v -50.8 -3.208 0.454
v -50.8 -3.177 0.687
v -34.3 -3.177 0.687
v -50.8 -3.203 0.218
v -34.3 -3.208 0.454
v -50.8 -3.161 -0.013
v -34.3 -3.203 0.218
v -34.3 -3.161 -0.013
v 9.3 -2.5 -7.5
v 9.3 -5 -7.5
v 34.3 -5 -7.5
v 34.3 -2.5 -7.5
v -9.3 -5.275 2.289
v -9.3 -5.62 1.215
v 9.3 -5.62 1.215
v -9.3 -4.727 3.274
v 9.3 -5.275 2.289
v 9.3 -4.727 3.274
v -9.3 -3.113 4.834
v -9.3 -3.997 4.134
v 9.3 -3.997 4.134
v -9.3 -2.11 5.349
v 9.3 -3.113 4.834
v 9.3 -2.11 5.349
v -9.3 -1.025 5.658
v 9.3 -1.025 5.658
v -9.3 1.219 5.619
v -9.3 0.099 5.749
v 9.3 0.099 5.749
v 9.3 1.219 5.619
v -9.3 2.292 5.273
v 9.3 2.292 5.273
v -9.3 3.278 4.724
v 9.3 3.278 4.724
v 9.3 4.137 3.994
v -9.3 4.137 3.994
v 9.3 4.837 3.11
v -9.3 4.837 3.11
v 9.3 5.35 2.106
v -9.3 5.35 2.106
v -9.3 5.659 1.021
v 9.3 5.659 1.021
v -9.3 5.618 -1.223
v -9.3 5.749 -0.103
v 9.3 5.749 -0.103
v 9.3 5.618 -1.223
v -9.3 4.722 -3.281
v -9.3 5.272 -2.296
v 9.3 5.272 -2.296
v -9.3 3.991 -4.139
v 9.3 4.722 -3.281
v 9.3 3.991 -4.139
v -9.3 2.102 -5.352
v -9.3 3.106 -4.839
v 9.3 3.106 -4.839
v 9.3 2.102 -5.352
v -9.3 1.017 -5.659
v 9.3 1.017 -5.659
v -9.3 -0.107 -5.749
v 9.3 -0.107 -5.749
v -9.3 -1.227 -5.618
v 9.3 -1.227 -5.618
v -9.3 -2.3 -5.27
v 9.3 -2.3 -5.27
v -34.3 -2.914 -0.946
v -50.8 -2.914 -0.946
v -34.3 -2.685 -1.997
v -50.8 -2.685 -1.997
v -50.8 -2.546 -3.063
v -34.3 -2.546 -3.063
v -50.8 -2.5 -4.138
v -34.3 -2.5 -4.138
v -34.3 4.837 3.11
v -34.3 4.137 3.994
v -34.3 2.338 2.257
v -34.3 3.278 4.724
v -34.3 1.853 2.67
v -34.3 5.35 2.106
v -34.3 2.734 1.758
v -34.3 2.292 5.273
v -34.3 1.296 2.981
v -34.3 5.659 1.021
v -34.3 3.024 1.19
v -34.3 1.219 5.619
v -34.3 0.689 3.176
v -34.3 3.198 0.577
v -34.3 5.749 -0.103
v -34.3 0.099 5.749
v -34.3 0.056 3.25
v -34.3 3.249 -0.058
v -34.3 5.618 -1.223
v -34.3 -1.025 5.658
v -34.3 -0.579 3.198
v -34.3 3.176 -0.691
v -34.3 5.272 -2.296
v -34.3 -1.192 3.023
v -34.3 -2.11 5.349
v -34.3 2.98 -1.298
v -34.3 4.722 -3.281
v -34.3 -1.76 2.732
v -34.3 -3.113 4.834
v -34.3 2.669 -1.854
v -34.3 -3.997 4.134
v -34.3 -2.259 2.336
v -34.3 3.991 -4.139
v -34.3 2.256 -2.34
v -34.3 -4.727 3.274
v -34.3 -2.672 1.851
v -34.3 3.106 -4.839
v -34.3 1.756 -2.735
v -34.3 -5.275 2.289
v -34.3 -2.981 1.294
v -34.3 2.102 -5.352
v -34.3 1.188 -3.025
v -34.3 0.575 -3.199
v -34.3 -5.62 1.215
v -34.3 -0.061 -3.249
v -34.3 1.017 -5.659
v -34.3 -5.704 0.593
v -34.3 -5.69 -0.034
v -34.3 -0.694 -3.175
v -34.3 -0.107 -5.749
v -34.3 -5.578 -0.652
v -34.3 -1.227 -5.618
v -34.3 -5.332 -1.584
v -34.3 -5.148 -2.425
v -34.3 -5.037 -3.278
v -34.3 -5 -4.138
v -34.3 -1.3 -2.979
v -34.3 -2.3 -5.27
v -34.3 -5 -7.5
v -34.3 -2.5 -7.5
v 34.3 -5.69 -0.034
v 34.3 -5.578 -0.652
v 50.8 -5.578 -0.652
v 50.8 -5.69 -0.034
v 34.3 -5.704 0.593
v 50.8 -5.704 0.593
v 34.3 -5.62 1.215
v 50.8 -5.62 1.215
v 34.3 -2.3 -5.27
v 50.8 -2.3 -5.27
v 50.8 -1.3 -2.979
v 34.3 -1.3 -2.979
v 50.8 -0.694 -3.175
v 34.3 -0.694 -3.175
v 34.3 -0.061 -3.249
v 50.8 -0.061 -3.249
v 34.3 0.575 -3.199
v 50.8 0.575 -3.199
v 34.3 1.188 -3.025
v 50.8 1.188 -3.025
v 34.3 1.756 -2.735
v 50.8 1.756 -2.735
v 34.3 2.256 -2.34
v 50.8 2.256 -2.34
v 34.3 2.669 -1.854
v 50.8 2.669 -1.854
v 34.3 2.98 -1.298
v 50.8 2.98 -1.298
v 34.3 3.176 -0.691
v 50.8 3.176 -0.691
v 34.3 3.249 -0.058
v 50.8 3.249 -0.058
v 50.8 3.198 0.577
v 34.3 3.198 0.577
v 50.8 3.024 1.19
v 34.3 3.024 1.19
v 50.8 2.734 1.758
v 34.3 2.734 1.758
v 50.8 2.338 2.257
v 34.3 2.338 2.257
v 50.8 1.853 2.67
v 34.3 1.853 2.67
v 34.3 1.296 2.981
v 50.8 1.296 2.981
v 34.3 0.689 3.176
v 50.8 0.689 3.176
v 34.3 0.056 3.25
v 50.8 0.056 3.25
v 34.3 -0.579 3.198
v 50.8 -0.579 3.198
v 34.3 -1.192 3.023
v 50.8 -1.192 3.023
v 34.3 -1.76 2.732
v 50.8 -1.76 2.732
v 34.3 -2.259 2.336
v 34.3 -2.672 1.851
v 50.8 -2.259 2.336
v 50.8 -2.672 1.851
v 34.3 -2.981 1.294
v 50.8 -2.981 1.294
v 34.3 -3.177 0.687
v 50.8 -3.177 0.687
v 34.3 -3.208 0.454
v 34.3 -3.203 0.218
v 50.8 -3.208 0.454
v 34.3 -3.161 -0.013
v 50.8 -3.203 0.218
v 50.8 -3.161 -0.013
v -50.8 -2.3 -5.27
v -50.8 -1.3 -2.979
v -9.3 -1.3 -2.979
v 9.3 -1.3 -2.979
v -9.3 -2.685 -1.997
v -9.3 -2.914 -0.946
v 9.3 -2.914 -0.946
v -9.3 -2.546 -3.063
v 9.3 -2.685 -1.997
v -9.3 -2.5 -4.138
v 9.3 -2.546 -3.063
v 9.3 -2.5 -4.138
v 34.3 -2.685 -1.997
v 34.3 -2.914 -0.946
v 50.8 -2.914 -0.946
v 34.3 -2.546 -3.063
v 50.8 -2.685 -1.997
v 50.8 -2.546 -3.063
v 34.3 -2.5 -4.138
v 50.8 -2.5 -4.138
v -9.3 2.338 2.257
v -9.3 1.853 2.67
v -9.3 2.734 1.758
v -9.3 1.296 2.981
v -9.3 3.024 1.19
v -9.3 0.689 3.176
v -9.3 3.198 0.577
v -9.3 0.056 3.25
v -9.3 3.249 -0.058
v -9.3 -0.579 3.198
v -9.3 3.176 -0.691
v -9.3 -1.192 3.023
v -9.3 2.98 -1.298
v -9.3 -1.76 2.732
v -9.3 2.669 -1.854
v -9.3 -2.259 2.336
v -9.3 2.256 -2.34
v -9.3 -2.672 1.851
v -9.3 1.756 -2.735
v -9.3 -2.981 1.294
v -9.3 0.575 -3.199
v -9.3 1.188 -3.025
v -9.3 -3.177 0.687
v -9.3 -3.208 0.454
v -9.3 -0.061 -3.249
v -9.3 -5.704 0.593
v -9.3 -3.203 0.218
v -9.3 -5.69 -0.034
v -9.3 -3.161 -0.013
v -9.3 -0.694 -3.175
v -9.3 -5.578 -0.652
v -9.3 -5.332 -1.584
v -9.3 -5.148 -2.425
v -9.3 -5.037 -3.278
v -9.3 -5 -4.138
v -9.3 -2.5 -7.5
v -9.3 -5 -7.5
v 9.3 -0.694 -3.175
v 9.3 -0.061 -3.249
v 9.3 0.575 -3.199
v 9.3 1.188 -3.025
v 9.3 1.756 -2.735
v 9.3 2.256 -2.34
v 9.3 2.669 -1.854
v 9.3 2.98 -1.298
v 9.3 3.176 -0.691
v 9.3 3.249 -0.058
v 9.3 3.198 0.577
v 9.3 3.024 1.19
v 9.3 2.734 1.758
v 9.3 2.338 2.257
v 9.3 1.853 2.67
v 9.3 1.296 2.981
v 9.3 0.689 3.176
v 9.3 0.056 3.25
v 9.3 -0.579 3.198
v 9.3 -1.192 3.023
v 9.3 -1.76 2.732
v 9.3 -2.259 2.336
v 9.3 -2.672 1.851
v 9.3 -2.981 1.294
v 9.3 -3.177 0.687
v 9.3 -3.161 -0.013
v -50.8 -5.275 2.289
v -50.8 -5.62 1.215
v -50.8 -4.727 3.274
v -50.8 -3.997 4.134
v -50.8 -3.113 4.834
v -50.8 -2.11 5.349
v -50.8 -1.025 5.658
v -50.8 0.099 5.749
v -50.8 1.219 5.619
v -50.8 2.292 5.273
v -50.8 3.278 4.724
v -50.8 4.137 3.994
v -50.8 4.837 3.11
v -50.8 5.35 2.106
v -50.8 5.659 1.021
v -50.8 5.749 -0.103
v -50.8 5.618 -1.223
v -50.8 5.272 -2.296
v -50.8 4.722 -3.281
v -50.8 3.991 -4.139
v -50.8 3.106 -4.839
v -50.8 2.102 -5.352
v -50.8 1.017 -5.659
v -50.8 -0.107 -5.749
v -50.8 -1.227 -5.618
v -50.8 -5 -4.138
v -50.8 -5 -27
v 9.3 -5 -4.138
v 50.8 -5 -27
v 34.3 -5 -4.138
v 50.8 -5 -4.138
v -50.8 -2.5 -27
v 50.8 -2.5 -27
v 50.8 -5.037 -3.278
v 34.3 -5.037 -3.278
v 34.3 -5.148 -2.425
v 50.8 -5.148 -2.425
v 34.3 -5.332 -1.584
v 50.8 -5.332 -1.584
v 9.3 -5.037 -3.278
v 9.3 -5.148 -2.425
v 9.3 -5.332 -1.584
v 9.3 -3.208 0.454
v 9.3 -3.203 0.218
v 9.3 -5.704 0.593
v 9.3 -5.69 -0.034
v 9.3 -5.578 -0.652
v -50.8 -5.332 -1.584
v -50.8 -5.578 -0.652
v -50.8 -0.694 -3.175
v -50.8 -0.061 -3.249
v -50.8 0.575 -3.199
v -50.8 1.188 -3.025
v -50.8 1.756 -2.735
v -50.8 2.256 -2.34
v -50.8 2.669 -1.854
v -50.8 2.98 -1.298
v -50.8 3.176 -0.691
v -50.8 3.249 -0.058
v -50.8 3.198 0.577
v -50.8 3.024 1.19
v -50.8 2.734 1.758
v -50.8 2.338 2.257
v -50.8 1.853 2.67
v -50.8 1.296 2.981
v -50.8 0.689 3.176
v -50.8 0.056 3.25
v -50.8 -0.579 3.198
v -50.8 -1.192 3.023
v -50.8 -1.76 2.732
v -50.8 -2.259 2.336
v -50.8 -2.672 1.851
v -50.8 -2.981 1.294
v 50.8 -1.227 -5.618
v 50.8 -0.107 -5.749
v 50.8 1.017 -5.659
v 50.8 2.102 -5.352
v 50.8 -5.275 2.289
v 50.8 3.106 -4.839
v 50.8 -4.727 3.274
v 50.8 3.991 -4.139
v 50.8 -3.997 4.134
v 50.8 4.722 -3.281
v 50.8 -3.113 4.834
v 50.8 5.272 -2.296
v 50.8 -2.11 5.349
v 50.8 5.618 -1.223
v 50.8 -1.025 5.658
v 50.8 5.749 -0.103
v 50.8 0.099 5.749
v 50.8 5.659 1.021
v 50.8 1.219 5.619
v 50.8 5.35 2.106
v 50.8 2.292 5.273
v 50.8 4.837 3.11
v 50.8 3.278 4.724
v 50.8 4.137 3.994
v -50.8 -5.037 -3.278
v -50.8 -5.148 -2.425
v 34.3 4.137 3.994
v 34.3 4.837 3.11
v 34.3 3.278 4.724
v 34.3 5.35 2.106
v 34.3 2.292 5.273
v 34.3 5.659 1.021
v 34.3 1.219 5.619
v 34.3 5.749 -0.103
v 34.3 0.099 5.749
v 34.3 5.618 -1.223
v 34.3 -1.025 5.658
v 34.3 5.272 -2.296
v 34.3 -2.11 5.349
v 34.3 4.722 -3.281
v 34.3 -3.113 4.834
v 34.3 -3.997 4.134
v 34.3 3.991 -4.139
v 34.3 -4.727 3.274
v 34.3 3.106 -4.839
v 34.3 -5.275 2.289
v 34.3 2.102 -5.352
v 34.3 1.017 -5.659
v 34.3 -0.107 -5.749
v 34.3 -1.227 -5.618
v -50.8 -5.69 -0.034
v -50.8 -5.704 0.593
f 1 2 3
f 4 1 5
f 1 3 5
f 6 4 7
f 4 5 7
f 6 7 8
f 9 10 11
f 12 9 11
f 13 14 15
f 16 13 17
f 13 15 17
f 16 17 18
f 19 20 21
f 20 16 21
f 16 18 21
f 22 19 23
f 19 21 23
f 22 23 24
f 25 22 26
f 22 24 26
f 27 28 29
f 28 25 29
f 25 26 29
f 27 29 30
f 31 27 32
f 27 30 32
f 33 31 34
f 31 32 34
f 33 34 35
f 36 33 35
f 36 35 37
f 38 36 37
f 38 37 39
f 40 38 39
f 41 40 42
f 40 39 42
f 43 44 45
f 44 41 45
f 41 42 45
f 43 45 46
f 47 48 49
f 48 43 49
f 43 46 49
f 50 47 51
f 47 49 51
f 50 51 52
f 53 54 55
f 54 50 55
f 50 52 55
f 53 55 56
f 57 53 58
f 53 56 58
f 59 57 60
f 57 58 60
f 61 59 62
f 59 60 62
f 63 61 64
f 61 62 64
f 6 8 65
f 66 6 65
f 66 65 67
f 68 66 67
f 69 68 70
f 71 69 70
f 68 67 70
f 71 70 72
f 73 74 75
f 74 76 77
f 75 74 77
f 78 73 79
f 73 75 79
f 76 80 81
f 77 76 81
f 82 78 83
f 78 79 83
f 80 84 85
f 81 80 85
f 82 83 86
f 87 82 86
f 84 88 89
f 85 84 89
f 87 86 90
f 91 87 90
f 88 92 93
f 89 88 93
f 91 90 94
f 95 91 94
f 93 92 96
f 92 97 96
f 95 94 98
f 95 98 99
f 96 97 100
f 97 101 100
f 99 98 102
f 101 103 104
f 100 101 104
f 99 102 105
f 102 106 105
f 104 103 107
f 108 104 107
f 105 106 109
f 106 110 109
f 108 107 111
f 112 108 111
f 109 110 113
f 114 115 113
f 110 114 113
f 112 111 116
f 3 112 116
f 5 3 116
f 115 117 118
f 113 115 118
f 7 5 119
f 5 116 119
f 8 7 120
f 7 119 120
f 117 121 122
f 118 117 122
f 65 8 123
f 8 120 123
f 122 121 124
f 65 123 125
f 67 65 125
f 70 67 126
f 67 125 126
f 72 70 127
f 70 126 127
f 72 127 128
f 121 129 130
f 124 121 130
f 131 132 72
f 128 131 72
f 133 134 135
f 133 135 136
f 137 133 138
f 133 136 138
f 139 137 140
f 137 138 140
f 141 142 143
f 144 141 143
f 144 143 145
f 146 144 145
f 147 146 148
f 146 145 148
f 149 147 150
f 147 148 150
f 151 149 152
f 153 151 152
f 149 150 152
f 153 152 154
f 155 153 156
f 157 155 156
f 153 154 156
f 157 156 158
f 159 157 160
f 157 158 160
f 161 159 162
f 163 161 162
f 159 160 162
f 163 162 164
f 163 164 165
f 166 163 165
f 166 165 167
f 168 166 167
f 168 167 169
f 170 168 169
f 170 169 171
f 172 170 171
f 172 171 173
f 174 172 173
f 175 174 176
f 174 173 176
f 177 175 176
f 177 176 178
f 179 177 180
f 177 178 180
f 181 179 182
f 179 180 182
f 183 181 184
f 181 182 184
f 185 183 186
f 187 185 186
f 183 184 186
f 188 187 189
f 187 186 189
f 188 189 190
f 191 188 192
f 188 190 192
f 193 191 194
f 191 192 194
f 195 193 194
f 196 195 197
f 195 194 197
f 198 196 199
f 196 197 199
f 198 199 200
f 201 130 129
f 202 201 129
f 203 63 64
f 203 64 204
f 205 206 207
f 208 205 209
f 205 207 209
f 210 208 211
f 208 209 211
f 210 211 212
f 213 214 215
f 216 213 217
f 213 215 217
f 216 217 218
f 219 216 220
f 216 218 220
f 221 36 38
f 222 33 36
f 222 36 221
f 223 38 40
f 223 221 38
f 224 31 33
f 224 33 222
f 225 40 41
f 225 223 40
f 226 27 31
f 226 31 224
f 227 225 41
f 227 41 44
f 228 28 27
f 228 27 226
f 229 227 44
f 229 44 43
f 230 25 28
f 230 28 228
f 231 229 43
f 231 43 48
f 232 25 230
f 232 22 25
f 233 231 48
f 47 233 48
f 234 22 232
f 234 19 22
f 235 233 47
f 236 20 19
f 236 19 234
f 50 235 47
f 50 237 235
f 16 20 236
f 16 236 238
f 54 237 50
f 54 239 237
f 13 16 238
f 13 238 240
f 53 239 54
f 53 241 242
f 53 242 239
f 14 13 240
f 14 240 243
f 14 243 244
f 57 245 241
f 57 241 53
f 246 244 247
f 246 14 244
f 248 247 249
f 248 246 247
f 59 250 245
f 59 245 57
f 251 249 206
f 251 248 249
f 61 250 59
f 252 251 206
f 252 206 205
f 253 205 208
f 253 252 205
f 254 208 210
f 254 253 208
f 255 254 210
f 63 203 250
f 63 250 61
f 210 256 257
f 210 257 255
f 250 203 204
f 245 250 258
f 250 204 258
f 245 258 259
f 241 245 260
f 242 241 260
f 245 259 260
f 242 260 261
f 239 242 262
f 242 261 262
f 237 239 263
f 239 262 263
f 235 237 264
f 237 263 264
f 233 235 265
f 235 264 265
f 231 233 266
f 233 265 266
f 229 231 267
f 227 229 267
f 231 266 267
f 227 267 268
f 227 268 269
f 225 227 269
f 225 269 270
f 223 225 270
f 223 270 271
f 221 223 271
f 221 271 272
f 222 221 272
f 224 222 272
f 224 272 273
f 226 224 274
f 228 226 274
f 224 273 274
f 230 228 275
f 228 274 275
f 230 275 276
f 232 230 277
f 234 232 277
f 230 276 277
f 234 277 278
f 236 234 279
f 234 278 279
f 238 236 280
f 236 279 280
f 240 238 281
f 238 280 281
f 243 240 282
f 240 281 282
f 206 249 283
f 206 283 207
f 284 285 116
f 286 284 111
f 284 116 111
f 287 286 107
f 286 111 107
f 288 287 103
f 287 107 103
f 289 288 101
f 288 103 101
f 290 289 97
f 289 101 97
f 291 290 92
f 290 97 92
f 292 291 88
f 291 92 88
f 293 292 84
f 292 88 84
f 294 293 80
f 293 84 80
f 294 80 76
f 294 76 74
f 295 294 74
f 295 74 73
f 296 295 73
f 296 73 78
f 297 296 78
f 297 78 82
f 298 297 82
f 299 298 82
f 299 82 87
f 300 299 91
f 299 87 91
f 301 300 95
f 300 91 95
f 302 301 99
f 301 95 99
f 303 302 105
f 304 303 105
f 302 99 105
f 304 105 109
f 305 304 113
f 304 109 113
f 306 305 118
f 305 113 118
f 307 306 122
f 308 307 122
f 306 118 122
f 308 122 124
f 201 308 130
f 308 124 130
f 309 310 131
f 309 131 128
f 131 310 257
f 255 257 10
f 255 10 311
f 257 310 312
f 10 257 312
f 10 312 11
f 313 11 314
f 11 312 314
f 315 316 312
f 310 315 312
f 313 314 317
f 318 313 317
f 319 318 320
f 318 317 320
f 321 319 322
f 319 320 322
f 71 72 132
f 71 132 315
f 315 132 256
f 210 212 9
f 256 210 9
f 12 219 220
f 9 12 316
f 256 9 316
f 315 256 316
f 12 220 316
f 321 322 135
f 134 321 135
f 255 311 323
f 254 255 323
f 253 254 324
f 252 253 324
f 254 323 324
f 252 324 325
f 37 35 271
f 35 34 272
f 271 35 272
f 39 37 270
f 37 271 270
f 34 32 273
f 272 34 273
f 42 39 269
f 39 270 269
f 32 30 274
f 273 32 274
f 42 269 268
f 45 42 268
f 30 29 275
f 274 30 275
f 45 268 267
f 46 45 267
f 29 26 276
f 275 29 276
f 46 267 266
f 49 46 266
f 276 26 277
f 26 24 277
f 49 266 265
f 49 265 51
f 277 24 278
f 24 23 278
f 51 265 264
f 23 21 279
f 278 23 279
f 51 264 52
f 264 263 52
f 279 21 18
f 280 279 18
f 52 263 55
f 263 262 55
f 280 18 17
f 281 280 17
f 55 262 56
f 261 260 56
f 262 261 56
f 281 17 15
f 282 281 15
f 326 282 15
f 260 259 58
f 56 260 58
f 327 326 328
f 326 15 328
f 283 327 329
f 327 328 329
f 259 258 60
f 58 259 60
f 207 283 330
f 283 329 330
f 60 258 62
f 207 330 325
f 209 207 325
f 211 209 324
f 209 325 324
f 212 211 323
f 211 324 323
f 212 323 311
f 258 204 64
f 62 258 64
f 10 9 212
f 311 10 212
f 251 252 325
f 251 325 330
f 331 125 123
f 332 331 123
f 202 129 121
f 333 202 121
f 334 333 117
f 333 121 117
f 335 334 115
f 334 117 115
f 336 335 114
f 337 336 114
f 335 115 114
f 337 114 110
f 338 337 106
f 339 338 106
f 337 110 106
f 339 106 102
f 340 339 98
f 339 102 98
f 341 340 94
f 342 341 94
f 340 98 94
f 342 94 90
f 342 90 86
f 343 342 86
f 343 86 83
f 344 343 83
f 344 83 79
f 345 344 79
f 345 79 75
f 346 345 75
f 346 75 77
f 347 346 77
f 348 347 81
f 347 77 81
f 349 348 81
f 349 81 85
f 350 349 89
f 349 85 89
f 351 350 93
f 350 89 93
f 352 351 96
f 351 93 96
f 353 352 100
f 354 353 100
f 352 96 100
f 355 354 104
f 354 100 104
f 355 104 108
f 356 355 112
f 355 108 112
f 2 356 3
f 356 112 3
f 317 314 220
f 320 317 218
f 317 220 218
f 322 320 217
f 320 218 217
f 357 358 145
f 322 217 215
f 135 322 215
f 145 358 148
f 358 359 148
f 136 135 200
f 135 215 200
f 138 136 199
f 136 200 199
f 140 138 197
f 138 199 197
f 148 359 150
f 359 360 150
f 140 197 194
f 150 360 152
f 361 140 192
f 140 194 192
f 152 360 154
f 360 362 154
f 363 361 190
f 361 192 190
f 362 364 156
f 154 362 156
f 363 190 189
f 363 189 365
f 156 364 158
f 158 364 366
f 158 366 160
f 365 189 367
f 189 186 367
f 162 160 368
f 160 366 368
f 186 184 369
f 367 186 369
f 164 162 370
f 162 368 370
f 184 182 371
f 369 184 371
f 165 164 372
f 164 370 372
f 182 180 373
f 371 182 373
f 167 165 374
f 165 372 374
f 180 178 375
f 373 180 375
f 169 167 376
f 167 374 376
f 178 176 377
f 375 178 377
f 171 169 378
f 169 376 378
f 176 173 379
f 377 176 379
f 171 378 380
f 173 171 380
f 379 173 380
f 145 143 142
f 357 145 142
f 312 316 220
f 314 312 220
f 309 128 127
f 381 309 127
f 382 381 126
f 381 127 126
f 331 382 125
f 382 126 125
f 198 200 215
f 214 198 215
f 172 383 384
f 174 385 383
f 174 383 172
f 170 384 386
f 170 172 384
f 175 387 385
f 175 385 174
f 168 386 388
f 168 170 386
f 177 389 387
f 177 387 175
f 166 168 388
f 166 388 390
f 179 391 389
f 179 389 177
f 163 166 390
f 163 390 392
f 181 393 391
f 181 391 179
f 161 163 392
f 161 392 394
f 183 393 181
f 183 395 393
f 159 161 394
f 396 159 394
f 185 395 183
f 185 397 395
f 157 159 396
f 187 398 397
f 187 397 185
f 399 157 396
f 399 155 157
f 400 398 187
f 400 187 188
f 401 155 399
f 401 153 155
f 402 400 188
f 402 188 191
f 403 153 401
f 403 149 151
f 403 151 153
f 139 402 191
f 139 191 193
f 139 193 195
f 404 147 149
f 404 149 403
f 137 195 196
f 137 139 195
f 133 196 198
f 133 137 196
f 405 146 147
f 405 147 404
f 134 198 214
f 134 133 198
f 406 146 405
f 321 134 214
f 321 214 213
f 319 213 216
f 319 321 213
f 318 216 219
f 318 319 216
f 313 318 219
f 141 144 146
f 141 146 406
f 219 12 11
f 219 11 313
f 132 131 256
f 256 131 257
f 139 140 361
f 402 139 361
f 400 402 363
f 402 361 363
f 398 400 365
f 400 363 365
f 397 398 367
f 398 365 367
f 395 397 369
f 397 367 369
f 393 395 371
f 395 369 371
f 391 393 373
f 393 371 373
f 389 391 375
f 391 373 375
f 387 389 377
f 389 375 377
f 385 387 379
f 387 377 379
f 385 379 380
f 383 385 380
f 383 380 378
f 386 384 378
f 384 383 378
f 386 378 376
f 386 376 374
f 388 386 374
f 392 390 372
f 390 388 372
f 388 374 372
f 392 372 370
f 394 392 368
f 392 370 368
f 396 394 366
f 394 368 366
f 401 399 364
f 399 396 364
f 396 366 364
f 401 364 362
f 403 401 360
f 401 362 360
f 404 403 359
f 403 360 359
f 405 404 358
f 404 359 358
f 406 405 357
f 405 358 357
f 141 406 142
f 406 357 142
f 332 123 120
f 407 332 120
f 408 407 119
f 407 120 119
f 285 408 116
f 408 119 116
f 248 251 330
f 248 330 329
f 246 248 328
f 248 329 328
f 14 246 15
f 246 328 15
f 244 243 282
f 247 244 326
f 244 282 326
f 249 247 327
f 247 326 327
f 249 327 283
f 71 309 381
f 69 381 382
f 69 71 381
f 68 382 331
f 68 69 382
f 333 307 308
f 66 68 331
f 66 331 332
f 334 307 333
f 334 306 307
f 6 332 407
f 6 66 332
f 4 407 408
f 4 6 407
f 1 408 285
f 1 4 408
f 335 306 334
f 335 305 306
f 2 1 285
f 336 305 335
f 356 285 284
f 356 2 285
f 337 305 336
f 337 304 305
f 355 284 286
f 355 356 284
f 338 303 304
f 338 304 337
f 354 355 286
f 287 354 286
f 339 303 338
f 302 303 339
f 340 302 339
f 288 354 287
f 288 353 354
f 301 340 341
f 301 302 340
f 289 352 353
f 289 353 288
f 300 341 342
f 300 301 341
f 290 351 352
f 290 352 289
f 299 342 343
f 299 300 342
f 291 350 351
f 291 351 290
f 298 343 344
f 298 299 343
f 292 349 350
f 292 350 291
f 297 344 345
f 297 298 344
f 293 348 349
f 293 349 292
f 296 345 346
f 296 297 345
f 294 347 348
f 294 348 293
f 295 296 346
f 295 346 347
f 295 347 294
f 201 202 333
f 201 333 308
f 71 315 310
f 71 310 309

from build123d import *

# Parameters (mm, degrees)
BASE_FLANGE1_DEPTH      = 50.8
CUT_EXTRUDE1_DEPTH      = 58.816109347
CUT_EXTRUDE1_DEPTH_BACK = 58.816109347
SKETCH6_W               = 25
SKETCH6_H               = 58.775055245


# Sheet-metal steps are written as plain solids
with BuildPart() as part:
    # Sketch1 → Base-Flange1 (new, symmetric)
    with BuildSketch(Plane(origin=(0, 0, 0), x_dir=(0, 0, -1), z_dir=(1, 0, 0))):
        with BuildLine():
            Line((27, -5), (4.137865616, -5))
            ThreePointArc((4.137865616, -5), (2.850262482, -5.083242558), (1.584096024, -5.331584366))
            Line((1.584096024, -5.331584366), (0.651734752, -5.577853864))
            ThreePointArc((0.651734752, -5.577853864), (-0.279113067, -5.709460074), (-1.214968707, -5.620173577))
            ThreePointArc((-1.214968707, -5.620173577), (-2.620425709, 5.118190022), (5.269962049, -2.3))
            Line((5.269962049, -2.3), (2.978674202, -1.3))
            ThreePointArc((2.978674202, -1.3), (-1.481110183, 2.892890013), (-0.686721443, -3.176619848))
            ThreePointArc((-0.686721443, -3.176619848), (-0.335775578, -3.210102284), (0.013292354, -3.160749956))
            Line((0.013292354, -3.160749956), (0.945653625, -2.914480458))
            ThreePointArc((0.945653625, -2.914480458), (2.528361698, -2.604053197), (4.137865616, -2.5))
            Line((4.137865616, -2.5), (27, -2.5))
            Line((27, -2.5), (27, -5))
        make_face()
    extrude(amount=BASE_FLANGE1_DEPTH, both=True)

    # Sketch6 → Cut-Extrude1 (cut, two sides: drawn at the far end of the back side and taken through both)
    with BuildSketch(Plane(origin=(0, 0, 0), x_dir=(1, 0, 0), z_dir=(0, 1, 0)).offset(-CUT_EXTRUDE1_DEPTH_BACK)):
        with Locations((-21.8, -21.887527623)):
            Rectangle(SKETCH6_W, SKETCH6_H)
        with Locations((21.8, -21.887527623)):
            Rectangle(SKETCH6_W, SKETCH6_H)
    extrude(amount=CUT_EXTRUDE1_DEPTH + CUT_EXTRUDE1_DEPTH_BACK, mode=Mode.SUBTRACT)


solid = part.part
